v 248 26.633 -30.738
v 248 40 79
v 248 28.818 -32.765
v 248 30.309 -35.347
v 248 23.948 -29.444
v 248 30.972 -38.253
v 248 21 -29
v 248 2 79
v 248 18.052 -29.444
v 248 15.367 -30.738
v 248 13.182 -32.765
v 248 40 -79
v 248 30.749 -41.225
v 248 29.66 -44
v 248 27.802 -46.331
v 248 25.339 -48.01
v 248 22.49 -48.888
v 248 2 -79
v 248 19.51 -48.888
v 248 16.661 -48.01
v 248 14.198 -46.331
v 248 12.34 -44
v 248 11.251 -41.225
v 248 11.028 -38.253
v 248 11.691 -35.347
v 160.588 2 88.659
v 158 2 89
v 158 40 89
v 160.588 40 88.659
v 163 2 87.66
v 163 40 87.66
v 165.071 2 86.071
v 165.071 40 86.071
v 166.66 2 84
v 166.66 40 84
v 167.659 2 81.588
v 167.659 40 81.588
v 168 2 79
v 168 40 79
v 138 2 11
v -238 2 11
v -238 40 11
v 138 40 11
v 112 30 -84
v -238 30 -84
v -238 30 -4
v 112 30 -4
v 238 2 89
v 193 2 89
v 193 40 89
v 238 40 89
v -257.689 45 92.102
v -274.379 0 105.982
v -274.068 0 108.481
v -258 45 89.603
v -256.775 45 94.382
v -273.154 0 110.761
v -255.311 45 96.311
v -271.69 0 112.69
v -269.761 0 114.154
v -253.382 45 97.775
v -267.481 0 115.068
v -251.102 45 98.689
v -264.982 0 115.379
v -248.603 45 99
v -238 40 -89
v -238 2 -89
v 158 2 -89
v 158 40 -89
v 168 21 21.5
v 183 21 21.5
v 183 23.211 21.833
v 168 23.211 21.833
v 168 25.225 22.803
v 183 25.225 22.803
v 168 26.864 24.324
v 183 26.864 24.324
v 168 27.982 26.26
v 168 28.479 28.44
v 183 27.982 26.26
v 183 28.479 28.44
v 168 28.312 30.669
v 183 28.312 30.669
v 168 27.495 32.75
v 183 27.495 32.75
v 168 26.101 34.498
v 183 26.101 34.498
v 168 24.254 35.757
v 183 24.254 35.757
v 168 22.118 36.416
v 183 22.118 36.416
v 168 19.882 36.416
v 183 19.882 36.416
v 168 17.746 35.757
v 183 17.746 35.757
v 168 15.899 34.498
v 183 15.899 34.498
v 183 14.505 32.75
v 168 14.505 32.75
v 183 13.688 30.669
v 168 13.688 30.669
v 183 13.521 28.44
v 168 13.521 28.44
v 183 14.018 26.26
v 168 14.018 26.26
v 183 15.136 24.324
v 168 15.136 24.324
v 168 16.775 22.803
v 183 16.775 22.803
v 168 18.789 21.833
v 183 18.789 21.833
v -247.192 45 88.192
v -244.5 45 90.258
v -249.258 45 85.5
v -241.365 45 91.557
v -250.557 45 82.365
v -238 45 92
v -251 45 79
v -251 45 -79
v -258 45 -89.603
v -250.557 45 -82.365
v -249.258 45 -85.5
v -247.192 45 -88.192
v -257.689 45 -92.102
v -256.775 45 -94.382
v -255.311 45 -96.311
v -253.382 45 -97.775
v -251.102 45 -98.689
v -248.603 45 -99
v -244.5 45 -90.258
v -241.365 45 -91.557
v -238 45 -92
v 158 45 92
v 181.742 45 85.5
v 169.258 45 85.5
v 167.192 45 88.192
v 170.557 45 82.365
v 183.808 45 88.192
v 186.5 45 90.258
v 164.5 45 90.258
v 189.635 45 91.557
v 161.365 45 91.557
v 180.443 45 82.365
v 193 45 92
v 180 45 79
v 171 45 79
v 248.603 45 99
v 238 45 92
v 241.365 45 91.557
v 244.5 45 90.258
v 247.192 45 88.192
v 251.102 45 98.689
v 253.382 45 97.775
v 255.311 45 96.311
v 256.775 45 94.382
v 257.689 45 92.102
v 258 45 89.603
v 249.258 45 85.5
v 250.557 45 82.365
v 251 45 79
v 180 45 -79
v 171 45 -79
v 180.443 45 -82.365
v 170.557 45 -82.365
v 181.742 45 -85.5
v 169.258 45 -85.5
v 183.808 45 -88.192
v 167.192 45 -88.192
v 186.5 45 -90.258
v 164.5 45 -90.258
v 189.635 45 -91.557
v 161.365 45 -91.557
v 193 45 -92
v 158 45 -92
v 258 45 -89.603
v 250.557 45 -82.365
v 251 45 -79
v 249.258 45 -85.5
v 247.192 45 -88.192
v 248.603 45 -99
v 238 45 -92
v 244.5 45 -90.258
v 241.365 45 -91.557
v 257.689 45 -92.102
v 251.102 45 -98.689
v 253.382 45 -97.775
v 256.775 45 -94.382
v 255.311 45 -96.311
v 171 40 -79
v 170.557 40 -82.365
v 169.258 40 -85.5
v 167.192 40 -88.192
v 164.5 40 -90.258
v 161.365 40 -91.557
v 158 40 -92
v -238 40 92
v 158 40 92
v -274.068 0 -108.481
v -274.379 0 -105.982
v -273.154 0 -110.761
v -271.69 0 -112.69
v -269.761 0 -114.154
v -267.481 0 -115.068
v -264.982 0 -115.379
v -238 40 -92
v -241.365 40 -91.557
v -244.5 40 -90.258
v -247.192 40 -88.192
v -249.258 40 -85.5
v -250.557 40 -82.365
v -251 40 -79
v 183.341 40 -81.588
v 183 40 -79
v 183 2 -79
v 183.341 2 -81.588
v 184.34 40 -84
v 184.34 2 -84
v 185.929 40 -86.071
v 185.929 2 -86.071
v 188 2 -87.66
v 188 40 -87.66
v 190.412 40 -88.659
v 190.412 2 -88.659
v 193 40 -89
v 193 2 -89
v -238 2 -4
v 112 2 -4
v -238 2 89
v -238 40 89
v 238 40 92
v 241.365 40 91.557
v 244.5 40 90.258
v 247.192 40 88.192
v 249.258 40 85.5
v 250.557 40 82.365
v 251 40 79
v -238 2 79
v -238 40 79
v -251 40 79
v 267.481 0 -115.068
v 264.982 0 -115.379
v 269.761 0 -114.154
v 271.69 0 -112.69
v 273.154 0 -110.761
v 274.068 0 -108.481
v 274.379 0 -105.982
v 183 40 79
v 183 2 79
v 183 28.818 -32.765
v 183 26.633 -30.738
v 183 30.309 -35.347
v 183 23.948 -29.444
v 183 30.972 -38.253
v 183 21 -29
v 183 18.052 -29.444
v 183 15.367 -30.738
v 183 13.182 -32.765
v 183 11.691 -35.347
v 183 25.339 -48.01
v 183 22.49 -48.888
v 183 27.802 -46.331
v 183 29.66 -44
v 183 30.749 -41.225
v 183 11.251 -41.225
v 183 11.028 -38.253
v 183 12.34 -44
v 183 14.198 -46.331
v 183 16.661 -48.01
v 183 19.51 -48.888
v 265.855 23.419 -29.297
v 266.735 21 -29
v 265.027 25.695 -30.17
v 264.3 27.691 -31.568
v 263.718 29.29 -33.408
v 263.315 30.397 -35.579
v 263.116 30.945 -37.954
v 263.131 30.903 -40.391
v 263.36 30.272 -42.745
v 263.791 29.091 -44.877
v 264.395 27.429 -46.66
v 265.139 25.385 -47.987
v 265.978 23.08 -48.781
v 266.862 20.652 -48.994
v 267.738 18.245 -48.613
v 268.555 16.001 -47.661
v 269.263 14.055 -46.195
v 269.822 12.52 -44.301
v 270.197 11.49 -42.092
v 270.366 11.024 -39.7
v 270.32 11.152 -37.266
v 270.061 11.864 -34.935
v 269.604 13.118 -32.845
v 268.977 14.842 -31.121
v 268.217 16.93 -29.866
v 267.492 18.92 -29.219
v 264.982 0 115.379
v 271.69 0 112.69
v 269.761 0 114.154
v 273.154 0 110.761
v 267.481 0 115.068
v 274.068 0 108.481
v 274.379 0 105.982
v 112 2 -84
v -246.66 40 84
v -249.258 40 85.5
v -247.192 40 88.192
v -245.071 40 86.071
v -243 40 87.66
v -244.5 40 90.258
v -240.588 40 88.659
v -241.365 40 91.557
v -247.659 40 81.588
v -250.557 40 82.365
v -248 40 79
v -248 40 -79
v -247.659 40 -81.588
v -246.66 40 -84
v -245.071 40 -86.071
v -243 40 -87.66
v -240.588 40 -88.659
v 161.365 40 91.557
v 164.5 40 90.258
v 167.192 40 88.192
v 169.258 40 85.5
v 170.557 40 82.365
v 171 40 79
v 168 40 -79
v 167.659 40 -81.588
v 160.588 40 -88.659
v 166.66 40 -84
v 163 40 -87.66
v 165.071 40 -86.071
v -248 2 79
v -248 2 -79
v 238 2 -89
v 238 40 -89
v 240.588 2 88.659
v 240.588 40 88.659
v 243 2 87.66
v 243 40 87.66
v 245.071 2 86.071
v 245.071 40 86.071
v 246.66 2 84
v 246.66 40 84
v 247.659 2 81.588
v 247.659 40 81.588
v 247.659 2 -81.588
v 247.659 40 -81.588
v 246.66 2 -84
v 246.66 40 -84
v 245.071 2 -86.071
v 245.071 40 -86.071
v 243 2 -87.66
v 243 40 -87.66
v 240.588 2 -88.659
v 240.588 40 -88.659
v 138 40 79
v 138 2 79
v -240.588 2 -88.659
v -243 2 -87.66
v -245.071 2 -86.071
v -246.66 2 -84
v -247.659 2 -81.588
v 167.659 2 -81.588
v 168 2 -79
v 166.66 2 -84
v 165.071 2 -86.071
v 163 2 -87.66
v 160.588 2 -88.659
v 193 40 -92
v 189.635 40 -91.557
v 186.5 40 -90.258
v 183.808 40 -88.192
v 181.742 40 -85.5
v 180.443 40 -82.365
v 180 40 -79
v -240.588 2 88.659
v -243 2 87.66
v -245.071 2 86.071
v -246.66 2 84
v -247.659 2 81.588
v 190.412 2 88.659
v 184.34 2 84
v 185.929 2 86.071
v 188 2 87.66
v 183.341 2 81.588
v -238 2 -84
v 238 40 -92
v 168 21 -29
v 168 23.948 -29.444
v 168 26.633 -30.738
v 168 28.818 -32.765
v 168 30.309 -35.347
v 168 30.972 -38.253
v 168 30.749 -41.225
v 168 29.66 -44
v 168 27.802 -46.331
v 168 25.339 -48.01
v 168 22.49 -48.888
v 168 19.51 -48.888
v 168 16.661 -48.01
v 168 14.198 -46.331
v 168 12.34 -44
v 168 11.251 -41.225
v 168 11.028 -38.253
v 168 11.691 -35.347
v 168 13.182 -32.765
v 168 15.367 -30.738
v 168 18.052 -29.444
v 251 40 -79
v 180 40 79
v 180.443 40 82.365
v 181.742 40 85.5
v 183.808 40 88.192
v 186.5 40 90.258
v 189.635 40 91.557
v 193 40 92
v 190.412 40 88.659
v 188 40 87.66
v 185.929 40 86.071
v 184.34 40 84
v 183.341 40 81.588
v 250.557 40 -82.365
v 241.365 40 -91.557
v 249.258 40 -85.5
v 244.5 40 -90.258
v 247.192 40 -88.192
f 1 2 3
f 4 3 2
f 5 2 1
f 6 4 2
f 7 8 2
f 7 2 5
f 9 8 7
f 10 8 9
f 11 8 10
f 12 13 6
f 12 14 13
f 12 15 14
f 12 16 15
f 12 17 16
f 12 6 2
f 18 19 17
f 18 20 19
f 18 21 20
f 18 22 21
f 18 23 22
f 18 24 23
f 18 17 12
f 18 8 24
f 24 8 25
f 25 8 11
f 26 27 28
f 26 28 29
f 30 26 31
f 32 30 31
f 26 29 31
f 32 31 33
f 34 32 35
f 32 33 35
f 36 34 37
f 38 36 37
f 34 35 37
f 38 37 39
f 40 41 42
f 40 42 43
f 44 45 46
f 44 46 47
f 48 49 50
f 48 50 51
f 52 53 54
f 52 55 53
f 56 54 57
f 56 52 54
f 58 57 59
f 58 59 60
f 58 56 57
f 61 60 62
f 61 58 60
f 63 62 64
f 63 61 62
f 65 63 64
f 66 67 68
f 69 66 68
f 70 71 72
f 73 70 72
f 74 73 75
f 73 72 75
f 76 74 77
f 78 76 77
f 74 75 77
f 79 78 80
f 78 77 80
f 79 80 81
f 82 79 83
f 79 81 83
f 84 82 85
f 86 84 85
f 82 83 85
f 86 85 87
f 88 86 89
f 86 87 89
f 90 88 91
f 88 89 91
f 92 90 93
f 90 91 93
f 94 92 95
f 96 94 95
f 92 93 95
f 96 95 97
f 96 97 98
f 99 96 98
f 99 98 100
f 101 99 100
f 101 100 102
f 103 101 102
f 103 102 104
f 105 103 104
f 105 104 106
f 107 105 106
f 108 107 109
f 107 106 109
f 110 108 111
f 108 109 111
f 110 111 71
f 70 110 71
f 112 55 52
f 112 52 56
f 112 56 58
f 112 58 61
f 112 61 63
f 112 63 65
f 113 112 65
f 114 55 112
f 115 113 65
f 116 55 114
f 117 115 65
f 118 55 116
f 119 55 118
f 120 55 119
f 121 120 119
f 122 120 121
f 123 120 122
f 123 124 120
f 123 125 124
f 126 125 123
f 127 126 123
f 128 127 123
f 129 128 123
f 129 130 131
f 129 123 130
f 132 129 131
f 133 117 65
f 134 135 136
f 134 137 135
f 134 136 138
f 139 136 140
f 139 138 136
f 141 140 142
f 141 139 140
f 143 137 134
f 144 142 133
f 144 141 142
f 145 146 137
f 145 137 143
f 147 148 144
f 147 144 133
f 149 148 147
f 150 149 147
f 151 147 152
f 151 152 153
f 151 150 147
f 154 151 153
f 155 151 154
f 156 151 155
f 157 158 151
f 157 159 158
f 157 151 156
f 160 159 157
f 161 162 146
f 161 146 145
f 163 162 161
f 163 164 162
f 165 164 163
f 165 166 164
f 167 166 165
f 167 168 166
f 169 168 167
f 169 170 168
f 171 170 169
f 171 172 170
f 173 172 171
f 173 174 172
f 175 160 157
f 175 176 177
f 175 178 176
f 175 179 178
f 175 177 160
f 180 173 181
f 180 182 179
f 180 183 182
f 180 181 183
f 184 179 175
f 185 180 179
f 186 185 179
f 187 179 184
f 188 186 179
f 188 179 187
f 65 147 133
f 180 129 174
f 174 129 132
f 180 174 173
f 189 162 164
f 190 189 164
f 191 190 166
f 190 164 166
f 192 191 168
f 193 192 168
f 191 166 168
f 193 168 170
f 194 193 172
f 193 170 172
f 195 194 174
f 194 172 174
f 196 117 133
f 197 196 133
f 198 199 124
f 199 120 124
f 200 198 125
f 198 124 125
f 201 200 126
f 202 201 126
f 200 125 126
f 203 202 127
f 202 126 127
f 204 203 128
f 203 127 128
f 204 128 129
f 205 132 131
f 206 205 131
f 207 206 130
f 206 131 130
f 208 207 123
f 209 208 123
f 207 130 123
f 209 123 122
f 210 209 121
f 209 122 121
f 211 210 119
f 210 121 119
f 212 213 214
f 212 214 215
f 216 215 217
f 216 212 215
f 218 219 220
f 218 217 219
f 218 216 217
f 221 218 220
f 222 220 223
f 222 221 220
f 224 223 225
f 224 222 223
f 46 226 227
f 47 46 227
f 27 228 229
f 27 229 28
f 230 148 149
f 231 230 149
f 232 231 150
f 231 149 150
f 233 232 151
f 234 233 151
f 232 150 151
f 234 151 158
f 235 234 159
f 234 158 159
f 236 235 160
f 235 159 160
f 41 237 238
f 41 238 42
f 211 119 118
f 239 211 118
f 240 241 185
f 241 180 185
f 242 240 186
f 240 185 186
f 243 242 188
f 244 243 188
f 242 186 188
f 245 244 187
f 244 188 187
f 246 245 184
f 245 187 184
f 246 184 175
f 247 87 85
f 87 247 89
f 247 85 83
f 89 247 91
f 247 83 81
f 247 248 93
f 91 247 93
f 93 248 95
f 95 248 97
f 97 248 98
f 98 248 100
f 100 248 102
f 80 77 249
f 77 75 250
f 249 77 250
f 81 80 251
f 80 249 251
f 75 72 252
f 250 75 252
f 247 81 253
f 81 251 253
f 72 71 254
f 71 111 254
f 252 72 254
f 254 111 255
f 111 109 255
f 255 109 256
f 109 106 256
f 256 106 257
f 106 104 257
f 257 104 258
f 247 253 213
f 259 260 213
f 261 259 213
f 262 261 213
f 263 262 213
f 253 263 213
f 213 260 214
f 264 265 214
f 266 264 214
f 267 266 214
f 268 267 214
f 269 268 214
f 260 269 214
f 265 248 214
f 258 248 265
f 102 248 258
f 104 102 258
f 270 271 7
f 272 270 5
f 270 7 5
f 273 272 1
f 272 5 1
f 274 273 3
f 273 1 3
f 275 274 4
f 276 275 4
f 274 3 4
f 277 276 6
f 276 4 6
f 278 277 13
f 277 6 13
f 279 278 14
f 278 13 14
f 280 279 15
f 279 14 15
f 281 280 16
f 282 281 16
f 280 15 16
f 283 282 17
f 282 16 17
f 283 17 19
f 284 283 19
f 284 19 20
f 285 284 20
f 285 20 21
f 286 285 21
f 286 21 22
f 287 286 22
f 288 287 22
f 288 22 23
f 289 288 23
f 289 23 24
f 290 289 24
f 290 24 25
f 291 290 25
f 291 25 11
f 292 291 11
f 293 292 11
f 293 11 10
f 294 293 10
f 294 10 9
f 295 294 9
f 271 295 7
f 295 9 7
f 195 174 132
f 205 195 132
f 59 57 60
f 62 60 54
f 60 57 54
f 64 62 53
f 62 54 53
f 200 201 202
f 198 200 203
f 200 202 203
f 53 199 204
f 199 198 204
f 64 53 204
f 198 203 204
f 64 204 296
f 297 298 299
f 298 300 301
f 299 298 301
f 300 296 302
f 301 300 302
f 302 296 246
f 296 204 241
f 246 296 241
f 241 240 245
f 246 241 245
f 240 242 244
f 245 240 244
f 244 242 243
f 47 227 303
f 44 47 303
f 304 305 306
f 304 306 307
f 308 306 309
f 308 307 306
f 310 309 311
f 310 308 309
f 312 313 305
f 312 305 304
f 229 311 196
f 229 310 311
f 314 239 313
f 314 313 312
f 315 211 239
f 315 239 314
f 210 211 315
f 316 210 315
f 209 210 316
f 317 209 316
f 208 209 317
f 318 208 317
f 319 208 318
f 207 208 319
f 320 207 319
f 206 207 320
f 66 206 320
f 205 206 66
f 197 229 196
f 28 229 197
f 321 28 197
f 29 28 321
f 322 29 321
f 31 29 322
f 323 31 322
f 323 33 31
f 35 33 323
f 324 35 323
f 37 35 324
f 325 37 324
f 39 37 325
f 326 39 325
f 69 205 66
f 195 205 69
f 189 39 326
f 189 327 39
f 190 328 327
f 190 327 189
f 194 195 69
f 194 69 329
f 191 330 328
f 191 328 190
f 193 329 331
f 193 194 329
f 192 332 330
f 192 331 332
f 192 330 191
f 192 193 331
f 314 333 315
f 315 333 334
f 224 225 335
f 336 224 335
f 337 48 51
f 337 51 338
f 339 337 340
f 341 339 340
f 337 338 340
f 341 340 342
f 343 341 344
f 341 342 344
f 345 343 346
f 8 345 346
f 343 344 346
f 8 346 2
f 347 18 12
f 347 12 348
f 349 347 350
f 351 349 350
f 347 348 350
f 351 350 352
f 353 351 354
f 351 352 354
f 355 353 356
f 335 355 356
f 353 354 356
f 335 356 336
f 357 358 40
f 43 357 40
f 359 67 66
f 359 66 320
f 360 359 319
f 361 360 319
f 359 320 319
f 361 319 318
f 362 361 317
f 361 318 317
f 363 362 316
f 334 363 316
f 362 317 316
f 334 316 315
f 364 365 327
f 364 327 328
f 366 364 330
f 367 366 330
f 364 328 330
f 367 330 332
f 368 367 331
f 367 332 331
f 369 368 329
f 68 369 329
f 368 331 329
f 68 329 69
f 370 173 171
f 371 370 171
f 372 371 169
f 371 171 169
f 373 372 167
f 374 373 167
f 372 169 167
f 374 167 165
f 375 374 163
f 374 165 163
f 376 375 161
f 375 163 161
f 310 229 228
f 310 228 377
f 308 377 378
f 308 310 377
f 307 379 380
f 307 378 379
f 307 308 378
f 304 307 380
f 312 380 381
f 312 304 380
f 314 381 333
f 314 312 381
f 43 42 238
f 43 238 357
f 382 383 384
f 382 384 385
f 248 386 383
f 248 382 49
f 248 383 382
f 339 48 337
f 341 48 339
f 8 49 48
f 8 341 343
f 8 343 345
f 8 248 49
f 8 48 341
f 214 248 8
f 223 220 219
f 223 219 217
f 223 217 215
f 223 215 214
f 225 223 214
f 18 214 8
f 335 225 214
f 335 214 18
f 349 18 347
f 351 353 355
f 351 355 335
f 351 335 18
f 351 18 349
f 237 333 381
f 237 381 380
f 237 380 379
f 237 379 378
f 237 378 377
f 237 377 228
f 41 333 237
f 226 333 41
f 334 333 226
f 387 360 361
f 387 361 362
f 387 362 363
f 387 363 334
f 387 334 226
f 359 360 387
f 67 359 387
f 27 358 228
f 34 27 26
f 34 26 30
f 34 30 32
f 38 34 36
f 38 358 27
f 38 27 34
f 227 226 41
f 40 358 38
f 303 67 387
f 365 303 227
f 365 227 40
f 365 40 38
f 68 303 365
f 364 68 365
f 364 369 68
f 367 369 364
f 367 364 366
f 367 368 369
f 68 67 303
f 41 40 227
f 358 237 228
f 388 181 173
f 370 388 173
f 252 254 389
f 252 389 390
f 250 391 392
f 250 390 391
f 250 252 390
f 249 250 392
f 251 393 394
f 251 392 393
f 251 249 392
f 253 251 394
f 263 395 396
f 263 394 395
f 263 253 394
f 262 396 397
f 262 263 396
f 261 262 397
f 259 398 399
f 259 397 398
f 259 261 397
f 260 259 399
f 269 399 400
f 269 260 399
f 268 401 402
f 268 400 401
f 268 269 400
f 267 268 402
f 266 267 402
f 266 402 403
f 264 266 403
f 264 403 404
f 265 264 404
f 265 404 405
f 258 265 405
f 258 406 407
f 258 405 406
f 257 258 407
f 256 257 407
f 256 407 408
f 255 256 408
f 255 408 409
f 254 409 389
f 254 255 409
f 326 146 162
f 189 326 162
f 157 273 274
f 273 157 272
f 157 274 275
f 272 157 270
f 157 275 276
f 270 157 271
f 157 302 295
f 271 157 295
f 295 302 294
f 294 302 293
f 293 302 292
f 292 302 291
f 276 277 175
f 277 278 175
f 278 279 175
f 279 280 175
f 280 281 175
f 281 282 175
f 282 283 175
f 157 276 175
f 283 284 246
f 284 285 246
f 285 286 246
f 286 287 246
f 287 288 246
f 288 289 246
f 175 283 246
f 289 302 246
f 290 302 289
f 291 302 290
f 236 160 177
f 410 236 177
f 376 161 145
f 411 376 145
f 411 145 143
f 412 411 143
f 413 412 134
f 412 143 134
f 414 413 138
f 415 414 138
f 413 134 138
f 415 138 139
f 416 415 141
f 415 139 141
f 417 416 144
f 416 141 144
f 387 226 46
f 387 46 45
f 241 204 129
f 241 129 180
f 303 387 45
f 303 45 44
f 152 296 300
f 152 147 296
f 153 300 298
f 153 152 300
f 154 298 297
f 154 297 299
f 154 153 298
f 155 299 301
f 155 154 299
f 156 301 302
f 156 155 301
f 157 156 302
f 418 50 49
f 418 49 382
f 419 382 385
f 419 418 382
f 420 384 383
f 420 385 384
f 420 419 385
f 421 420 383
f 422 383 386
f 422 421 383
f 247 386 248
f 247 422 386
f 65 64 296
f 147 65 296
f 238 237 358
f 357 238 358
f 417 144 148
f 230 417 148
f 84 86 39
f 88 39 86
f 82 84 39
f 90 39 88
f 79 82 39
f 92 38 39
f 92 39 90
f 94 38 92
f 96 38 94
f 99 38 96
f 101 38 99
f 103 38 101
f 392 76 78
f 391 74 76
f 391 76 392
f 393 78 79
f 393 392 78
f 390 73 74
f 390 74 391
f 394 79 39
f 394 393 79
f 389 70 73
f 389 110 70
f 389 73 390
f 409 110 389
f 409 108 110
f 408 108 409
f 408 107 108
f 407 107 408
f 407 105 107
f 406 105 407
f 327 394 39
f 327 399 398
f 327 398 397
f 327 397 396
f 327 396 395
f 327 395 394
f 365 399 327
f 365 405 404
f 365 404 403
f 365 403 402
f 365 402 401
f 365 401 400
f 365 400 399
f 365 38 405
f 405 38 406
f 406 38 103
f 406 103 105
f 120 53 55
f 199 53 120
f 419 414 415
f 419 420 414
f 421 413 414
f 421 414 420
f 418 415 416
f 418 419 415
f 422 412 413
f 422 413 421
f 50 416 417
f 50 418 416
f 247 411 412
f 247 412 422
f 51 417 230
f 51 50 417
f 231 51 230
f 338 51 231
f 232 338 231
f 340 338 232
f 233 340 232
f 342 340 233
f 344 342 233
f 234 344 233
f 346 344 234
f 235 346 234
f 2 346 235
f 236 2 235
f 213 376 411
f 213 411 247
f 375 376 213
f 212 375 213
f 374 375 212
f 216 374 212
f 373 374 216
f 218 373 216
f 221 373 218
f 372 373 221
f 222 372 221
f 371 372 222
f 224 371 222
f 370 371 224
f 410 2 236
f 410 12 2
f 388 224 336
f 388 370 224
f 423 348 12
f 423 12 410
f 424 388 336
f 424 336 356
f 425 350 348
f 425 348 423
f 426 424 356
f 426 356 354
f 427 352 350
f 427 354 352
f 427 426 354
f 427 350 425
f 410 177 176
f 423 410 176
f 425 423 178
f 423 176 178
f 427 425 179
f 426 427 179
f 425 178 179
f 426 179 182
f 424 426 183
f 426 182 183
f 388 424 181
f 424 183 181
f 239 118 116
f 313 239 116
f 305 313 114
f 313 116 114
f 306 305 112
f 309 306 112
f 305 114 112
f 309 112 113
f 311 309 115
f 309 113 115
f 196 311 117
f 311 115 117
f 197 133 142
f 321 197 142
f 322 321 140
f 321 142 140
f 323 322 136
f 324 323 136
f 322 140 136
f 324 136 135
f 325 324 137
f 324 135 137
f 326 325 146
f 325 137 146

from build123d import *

# Parameters (mm, degrees)
SKETCH2_W                      = 516
SKETCH2_H                      = 198
SKETCH2_W_2                    = 65
SKETCH2_H_2                    = 178
SKETCH2_W_3                    = 416
BOSS_EXTRUDE2_DEPTH            = 45
DRAFT3_ANGLE                   = 20
FILLET1_R                      = 10
SKETCH2_3_W                    = 416
SKETCH2_3_H                    = 178
SKETCH2_3_W_2                  = 350
SKETCH2_3_H_2                  = 80
SKETCH2_3_W_3                  = 376
SKETCH2_3_H_3                  = 68
SKETCH2_3_W_4                  = 65
BOSS_EXTRUDE3_DEPTH            = 2
CUT_EXTRUDE1_DEPTH             = 5
SKETCH2_5_W                    = 376
SKETCH2_5_H                    = 68
BOSS_EXTRUDE4_DEPTH            = 40
SKETCH2_6_W                    = 350
SKETCH2_6_H                    = 80
BOSS_EXTRUDE5_DEPTH            = 30
CUT_EXTRUDE2_REACH             = 538.858
SKETCH4_R                      = 10
CUT_EXTRUDE2_DIRECTION_2_DEPTH = 54
SKETCH5_R                      = 7.5
CUT_EXTRUDE3_DEPTH             = 15


with BuildPart() as part:
    # Sketch2 → Boss-Extrude2 (new body)
    with BuildSketch(Plane(origin=(0, 0, 0), x_dir=(1, 0, 0), z_dir=(0, 1, 0))):
        Rectangle(SKETCH2_W, SKETCH2_H)
        with Locations((215.5, 0)):
            Rectangle(SKETCH2_W_2, SKETCH2_H_2, mode=Mode.SUBTRACT)
        with Locations((-40, 0)):
            Rectangle(SKETCH2_W_3, SKETCH2_H_2, mode=Mode.SUBTRACT)
    extrude(amount=BOSS_EXTRUDE2_DEPTH)

    # Draft3
    draft3_faces = [part.faces().sort_by_distance(p)[0] for p in [
        (0, 22.5, -99),
        (258, 22.5, 0),
        (0, 22.5, 99),
        (-258, 22.5, 0),
    ]]
    draft(draft3_faces, Plane.ZX.offset(45), DRAFT3_ANGLE)

    # Fillet1
    fillet1_edges = [part.edges().sort_by_distance(p)[0] for p in [
        (-248, 22.5, 89),
        (168, 22.5, 89),
        (168, 22.5, -89),
        (-248, 22.5, -89),
        (-266.189330271, 22.5, -107.189330271),
        (266.189330271, 22.5, -107.189330271),
        (266.189330271, 22.5, 107.189330271),
        (-266.189330271, 22.5, 107.189330271),
        (248, 22.5, 89),
        (248, 22.5, -89),
        (183, 22.5, -89),
        (183, 22.5, 89),
    ]]
    fillet(fillet1_edges, radius=FILLET1_R)

    # Sketch2<3> → Boss-Extrude3 (add)
    # profile 1 of 4: a face of its own
    with BuildSketch(Plane(origin=(0, 0, 0), x_dir=(1, 0, 0), z_dir=(0, 1, 0))):
        with Locations((-40, 0)):
            Rectangle(SKETCH2_3_W, SKETCH2_3_H)
        with Locations((-63, 44)):
            Rectangle(SKETCH2_3_W_2, SKETCH2_3_H_2, mode=Mode.SUBTRACT)
        with Locations((-50, -45)):
            Rectangle(SKETCH2_3_W_3, SKETCH2_3_H_3, mode=Mode.SUBTRACT)
    # profile 2 of 4: a face of its own
    with BuildSketch(Plane(origin=(0, 0, 0), x_dir=(1, 0, 0), z_dir=(0, 1, 0))):
        with Locations((-50, -45)):
            Rectangle(SKETCH2_3_W_3, SKETCH2_3_H_3)
    # profile 3 of 4: a face of its own
    with BuildSketch(Plane(origin=(0, 0, 0), x_dir=(1, 0, 0), z_dir=(0, 1, 0))):
        with Locations((-63, 44)):
            Rectangle(SKETCH2_3_W_2, SKETCH2_3_H_2)
    # profile 4 of 4: a face of its own
    with BuildSketch(Plane(origin=(0, 0, 0), x_dir=(1, 0, 0), z_dir=(0, 1, 0))):
        with Locations((215.5, 0)):
            Rectangle(SKETCH2_3_W_4, SKETCH2_3_H)
    extrude(amount=BOSS_EXTRUDE3_DEPTH)

    # Sketch3 → Cut-Extrude1 (cut)
    with BuildSketch(Plane(origin=(0, 45, 0), x_dir=(1, 0, 0), z_dir=(0, 1, 0))):
        with BuildLine():
            Line((171, -79), (171, 79))
            ThreePointArc((171, 79), (167.192388155, 88.192388155), (158, 92))
            Line((158, 92), (-238, 92))
            ThreePointArc((-238, 92), (-247.192388155, 88.192388155), (-251, 79))
            Line((-251, 79), (-251, -79))
            ThreePointArc((-251, -79), (-247.192388155, -88.192388155), (-238, -92))
            Line((-238, -92), (158, -92))
            ThreePointArc((158, -92), (167.192388155, -88.192388155), (171, -79))
        make_face()
        with BuildLine():
            Line((193, -92), (238, -92))
            ThreePointArc((238, -92), (247.192388155, -88.192388155), (251, -79))
            Line((251, -79), (251, 79))
            ThreePointArc((251, 79), (247.192388155, 88.192388155), (238, 92))
            Line((238, 92), (193, 92))
            ThreePointArc((193, 92), (183.807611845, 88.192388155), (180, 79))
            Line((180, 79), (180, -79))
            ThreePointArc((180, -79), (183.807611845, -88.192388155), (193, -92))
        make_face()
    extrude(amount=-CUT_EXTRUDE1_DEPTH, mode=Mode.SUBTRACT)

    # Sketch2<5> → Boss-Extrude4 (add)
    with BuildSketch(Plane(origin=(0, 0, 0), x_dir=(1, 0, 0), z_dir=(0, 1, 0))):
        with Locations((-50, -45)):
            Rectangle(SKETCH2_5_W, SKETCH2_5_H)
    extrude(amount=BOSS_EXTRUDE4_DEPTH)

    # Sketch2<6> → Boss-Extrude5 (add)
    with BuildSketch(Plane(origin=(0, 0, 0), x_dir=(1, 0, 0), z_dir=(0, 1, 0))):
        with Locations((-63, 44)):
            Rectangle(SKETCH2_6_W, SKETCH2_6_H)
    extrude(amount=BOSS_EXTRUDE5_DEPTH)

    # Cut-Extrude2: up to this face of the body (flat: up to its plane)
    cut_extrude2_end = Plane(part.part.faces().sort_by_distance((168, 21, 0))[0])
    # Sketch4 → Cut-Extrude2 (cut, up to the picked face)
    with BuildSketch(Plane.ZY.offset(-248), mode=Mode.PRIVATE) as cut_extrude2_sk1:
        with Locations((-39, 21)):
            Circle(SKETCH4_R)
    cut_extrude2_tool1 = split(extrude(cut_extrude2_sk1.sketch, amount=CUT_EXTRUDE2_REACH, mode=Mode.PRIVATE), bisect_by=cut_extrude2_end, keep=Keep.BOTH, mode=Mode.PRIVATE)
    add(cut_extrude2_tool1.solids().sort_by(Axis((248, 21, -39), (-1, 0, 0)))[0], mode=Mode.SUBTRACT)

    # Sketch4 → Cut-Extrude2 direction 2 (cut)
    with BuildSketch(Plane.ZY.offset(-248)):
        with Locations((-39, 21)):
            Circle(SKETCH4_R)
    extrude(amount=-CUT_EXTRUDE2_DIRECTION_2_DEPTH, mode=Mode.SUBTRACT)

    # Sketch5 → Cut-Extrude3 (cut)
    with BuildSketch(Plane(origin=(183, 0, 0), x_dir=(0, 0, -1), z_dir=(1, 0, 0))):
        with Locations((-29, 21)):
            Circle(SKETCH5_R)
    extrude(amount=-CUT_EXTRUDE3_DEPTH, mode=Mode.SUBTRACT)


solid = part.part
